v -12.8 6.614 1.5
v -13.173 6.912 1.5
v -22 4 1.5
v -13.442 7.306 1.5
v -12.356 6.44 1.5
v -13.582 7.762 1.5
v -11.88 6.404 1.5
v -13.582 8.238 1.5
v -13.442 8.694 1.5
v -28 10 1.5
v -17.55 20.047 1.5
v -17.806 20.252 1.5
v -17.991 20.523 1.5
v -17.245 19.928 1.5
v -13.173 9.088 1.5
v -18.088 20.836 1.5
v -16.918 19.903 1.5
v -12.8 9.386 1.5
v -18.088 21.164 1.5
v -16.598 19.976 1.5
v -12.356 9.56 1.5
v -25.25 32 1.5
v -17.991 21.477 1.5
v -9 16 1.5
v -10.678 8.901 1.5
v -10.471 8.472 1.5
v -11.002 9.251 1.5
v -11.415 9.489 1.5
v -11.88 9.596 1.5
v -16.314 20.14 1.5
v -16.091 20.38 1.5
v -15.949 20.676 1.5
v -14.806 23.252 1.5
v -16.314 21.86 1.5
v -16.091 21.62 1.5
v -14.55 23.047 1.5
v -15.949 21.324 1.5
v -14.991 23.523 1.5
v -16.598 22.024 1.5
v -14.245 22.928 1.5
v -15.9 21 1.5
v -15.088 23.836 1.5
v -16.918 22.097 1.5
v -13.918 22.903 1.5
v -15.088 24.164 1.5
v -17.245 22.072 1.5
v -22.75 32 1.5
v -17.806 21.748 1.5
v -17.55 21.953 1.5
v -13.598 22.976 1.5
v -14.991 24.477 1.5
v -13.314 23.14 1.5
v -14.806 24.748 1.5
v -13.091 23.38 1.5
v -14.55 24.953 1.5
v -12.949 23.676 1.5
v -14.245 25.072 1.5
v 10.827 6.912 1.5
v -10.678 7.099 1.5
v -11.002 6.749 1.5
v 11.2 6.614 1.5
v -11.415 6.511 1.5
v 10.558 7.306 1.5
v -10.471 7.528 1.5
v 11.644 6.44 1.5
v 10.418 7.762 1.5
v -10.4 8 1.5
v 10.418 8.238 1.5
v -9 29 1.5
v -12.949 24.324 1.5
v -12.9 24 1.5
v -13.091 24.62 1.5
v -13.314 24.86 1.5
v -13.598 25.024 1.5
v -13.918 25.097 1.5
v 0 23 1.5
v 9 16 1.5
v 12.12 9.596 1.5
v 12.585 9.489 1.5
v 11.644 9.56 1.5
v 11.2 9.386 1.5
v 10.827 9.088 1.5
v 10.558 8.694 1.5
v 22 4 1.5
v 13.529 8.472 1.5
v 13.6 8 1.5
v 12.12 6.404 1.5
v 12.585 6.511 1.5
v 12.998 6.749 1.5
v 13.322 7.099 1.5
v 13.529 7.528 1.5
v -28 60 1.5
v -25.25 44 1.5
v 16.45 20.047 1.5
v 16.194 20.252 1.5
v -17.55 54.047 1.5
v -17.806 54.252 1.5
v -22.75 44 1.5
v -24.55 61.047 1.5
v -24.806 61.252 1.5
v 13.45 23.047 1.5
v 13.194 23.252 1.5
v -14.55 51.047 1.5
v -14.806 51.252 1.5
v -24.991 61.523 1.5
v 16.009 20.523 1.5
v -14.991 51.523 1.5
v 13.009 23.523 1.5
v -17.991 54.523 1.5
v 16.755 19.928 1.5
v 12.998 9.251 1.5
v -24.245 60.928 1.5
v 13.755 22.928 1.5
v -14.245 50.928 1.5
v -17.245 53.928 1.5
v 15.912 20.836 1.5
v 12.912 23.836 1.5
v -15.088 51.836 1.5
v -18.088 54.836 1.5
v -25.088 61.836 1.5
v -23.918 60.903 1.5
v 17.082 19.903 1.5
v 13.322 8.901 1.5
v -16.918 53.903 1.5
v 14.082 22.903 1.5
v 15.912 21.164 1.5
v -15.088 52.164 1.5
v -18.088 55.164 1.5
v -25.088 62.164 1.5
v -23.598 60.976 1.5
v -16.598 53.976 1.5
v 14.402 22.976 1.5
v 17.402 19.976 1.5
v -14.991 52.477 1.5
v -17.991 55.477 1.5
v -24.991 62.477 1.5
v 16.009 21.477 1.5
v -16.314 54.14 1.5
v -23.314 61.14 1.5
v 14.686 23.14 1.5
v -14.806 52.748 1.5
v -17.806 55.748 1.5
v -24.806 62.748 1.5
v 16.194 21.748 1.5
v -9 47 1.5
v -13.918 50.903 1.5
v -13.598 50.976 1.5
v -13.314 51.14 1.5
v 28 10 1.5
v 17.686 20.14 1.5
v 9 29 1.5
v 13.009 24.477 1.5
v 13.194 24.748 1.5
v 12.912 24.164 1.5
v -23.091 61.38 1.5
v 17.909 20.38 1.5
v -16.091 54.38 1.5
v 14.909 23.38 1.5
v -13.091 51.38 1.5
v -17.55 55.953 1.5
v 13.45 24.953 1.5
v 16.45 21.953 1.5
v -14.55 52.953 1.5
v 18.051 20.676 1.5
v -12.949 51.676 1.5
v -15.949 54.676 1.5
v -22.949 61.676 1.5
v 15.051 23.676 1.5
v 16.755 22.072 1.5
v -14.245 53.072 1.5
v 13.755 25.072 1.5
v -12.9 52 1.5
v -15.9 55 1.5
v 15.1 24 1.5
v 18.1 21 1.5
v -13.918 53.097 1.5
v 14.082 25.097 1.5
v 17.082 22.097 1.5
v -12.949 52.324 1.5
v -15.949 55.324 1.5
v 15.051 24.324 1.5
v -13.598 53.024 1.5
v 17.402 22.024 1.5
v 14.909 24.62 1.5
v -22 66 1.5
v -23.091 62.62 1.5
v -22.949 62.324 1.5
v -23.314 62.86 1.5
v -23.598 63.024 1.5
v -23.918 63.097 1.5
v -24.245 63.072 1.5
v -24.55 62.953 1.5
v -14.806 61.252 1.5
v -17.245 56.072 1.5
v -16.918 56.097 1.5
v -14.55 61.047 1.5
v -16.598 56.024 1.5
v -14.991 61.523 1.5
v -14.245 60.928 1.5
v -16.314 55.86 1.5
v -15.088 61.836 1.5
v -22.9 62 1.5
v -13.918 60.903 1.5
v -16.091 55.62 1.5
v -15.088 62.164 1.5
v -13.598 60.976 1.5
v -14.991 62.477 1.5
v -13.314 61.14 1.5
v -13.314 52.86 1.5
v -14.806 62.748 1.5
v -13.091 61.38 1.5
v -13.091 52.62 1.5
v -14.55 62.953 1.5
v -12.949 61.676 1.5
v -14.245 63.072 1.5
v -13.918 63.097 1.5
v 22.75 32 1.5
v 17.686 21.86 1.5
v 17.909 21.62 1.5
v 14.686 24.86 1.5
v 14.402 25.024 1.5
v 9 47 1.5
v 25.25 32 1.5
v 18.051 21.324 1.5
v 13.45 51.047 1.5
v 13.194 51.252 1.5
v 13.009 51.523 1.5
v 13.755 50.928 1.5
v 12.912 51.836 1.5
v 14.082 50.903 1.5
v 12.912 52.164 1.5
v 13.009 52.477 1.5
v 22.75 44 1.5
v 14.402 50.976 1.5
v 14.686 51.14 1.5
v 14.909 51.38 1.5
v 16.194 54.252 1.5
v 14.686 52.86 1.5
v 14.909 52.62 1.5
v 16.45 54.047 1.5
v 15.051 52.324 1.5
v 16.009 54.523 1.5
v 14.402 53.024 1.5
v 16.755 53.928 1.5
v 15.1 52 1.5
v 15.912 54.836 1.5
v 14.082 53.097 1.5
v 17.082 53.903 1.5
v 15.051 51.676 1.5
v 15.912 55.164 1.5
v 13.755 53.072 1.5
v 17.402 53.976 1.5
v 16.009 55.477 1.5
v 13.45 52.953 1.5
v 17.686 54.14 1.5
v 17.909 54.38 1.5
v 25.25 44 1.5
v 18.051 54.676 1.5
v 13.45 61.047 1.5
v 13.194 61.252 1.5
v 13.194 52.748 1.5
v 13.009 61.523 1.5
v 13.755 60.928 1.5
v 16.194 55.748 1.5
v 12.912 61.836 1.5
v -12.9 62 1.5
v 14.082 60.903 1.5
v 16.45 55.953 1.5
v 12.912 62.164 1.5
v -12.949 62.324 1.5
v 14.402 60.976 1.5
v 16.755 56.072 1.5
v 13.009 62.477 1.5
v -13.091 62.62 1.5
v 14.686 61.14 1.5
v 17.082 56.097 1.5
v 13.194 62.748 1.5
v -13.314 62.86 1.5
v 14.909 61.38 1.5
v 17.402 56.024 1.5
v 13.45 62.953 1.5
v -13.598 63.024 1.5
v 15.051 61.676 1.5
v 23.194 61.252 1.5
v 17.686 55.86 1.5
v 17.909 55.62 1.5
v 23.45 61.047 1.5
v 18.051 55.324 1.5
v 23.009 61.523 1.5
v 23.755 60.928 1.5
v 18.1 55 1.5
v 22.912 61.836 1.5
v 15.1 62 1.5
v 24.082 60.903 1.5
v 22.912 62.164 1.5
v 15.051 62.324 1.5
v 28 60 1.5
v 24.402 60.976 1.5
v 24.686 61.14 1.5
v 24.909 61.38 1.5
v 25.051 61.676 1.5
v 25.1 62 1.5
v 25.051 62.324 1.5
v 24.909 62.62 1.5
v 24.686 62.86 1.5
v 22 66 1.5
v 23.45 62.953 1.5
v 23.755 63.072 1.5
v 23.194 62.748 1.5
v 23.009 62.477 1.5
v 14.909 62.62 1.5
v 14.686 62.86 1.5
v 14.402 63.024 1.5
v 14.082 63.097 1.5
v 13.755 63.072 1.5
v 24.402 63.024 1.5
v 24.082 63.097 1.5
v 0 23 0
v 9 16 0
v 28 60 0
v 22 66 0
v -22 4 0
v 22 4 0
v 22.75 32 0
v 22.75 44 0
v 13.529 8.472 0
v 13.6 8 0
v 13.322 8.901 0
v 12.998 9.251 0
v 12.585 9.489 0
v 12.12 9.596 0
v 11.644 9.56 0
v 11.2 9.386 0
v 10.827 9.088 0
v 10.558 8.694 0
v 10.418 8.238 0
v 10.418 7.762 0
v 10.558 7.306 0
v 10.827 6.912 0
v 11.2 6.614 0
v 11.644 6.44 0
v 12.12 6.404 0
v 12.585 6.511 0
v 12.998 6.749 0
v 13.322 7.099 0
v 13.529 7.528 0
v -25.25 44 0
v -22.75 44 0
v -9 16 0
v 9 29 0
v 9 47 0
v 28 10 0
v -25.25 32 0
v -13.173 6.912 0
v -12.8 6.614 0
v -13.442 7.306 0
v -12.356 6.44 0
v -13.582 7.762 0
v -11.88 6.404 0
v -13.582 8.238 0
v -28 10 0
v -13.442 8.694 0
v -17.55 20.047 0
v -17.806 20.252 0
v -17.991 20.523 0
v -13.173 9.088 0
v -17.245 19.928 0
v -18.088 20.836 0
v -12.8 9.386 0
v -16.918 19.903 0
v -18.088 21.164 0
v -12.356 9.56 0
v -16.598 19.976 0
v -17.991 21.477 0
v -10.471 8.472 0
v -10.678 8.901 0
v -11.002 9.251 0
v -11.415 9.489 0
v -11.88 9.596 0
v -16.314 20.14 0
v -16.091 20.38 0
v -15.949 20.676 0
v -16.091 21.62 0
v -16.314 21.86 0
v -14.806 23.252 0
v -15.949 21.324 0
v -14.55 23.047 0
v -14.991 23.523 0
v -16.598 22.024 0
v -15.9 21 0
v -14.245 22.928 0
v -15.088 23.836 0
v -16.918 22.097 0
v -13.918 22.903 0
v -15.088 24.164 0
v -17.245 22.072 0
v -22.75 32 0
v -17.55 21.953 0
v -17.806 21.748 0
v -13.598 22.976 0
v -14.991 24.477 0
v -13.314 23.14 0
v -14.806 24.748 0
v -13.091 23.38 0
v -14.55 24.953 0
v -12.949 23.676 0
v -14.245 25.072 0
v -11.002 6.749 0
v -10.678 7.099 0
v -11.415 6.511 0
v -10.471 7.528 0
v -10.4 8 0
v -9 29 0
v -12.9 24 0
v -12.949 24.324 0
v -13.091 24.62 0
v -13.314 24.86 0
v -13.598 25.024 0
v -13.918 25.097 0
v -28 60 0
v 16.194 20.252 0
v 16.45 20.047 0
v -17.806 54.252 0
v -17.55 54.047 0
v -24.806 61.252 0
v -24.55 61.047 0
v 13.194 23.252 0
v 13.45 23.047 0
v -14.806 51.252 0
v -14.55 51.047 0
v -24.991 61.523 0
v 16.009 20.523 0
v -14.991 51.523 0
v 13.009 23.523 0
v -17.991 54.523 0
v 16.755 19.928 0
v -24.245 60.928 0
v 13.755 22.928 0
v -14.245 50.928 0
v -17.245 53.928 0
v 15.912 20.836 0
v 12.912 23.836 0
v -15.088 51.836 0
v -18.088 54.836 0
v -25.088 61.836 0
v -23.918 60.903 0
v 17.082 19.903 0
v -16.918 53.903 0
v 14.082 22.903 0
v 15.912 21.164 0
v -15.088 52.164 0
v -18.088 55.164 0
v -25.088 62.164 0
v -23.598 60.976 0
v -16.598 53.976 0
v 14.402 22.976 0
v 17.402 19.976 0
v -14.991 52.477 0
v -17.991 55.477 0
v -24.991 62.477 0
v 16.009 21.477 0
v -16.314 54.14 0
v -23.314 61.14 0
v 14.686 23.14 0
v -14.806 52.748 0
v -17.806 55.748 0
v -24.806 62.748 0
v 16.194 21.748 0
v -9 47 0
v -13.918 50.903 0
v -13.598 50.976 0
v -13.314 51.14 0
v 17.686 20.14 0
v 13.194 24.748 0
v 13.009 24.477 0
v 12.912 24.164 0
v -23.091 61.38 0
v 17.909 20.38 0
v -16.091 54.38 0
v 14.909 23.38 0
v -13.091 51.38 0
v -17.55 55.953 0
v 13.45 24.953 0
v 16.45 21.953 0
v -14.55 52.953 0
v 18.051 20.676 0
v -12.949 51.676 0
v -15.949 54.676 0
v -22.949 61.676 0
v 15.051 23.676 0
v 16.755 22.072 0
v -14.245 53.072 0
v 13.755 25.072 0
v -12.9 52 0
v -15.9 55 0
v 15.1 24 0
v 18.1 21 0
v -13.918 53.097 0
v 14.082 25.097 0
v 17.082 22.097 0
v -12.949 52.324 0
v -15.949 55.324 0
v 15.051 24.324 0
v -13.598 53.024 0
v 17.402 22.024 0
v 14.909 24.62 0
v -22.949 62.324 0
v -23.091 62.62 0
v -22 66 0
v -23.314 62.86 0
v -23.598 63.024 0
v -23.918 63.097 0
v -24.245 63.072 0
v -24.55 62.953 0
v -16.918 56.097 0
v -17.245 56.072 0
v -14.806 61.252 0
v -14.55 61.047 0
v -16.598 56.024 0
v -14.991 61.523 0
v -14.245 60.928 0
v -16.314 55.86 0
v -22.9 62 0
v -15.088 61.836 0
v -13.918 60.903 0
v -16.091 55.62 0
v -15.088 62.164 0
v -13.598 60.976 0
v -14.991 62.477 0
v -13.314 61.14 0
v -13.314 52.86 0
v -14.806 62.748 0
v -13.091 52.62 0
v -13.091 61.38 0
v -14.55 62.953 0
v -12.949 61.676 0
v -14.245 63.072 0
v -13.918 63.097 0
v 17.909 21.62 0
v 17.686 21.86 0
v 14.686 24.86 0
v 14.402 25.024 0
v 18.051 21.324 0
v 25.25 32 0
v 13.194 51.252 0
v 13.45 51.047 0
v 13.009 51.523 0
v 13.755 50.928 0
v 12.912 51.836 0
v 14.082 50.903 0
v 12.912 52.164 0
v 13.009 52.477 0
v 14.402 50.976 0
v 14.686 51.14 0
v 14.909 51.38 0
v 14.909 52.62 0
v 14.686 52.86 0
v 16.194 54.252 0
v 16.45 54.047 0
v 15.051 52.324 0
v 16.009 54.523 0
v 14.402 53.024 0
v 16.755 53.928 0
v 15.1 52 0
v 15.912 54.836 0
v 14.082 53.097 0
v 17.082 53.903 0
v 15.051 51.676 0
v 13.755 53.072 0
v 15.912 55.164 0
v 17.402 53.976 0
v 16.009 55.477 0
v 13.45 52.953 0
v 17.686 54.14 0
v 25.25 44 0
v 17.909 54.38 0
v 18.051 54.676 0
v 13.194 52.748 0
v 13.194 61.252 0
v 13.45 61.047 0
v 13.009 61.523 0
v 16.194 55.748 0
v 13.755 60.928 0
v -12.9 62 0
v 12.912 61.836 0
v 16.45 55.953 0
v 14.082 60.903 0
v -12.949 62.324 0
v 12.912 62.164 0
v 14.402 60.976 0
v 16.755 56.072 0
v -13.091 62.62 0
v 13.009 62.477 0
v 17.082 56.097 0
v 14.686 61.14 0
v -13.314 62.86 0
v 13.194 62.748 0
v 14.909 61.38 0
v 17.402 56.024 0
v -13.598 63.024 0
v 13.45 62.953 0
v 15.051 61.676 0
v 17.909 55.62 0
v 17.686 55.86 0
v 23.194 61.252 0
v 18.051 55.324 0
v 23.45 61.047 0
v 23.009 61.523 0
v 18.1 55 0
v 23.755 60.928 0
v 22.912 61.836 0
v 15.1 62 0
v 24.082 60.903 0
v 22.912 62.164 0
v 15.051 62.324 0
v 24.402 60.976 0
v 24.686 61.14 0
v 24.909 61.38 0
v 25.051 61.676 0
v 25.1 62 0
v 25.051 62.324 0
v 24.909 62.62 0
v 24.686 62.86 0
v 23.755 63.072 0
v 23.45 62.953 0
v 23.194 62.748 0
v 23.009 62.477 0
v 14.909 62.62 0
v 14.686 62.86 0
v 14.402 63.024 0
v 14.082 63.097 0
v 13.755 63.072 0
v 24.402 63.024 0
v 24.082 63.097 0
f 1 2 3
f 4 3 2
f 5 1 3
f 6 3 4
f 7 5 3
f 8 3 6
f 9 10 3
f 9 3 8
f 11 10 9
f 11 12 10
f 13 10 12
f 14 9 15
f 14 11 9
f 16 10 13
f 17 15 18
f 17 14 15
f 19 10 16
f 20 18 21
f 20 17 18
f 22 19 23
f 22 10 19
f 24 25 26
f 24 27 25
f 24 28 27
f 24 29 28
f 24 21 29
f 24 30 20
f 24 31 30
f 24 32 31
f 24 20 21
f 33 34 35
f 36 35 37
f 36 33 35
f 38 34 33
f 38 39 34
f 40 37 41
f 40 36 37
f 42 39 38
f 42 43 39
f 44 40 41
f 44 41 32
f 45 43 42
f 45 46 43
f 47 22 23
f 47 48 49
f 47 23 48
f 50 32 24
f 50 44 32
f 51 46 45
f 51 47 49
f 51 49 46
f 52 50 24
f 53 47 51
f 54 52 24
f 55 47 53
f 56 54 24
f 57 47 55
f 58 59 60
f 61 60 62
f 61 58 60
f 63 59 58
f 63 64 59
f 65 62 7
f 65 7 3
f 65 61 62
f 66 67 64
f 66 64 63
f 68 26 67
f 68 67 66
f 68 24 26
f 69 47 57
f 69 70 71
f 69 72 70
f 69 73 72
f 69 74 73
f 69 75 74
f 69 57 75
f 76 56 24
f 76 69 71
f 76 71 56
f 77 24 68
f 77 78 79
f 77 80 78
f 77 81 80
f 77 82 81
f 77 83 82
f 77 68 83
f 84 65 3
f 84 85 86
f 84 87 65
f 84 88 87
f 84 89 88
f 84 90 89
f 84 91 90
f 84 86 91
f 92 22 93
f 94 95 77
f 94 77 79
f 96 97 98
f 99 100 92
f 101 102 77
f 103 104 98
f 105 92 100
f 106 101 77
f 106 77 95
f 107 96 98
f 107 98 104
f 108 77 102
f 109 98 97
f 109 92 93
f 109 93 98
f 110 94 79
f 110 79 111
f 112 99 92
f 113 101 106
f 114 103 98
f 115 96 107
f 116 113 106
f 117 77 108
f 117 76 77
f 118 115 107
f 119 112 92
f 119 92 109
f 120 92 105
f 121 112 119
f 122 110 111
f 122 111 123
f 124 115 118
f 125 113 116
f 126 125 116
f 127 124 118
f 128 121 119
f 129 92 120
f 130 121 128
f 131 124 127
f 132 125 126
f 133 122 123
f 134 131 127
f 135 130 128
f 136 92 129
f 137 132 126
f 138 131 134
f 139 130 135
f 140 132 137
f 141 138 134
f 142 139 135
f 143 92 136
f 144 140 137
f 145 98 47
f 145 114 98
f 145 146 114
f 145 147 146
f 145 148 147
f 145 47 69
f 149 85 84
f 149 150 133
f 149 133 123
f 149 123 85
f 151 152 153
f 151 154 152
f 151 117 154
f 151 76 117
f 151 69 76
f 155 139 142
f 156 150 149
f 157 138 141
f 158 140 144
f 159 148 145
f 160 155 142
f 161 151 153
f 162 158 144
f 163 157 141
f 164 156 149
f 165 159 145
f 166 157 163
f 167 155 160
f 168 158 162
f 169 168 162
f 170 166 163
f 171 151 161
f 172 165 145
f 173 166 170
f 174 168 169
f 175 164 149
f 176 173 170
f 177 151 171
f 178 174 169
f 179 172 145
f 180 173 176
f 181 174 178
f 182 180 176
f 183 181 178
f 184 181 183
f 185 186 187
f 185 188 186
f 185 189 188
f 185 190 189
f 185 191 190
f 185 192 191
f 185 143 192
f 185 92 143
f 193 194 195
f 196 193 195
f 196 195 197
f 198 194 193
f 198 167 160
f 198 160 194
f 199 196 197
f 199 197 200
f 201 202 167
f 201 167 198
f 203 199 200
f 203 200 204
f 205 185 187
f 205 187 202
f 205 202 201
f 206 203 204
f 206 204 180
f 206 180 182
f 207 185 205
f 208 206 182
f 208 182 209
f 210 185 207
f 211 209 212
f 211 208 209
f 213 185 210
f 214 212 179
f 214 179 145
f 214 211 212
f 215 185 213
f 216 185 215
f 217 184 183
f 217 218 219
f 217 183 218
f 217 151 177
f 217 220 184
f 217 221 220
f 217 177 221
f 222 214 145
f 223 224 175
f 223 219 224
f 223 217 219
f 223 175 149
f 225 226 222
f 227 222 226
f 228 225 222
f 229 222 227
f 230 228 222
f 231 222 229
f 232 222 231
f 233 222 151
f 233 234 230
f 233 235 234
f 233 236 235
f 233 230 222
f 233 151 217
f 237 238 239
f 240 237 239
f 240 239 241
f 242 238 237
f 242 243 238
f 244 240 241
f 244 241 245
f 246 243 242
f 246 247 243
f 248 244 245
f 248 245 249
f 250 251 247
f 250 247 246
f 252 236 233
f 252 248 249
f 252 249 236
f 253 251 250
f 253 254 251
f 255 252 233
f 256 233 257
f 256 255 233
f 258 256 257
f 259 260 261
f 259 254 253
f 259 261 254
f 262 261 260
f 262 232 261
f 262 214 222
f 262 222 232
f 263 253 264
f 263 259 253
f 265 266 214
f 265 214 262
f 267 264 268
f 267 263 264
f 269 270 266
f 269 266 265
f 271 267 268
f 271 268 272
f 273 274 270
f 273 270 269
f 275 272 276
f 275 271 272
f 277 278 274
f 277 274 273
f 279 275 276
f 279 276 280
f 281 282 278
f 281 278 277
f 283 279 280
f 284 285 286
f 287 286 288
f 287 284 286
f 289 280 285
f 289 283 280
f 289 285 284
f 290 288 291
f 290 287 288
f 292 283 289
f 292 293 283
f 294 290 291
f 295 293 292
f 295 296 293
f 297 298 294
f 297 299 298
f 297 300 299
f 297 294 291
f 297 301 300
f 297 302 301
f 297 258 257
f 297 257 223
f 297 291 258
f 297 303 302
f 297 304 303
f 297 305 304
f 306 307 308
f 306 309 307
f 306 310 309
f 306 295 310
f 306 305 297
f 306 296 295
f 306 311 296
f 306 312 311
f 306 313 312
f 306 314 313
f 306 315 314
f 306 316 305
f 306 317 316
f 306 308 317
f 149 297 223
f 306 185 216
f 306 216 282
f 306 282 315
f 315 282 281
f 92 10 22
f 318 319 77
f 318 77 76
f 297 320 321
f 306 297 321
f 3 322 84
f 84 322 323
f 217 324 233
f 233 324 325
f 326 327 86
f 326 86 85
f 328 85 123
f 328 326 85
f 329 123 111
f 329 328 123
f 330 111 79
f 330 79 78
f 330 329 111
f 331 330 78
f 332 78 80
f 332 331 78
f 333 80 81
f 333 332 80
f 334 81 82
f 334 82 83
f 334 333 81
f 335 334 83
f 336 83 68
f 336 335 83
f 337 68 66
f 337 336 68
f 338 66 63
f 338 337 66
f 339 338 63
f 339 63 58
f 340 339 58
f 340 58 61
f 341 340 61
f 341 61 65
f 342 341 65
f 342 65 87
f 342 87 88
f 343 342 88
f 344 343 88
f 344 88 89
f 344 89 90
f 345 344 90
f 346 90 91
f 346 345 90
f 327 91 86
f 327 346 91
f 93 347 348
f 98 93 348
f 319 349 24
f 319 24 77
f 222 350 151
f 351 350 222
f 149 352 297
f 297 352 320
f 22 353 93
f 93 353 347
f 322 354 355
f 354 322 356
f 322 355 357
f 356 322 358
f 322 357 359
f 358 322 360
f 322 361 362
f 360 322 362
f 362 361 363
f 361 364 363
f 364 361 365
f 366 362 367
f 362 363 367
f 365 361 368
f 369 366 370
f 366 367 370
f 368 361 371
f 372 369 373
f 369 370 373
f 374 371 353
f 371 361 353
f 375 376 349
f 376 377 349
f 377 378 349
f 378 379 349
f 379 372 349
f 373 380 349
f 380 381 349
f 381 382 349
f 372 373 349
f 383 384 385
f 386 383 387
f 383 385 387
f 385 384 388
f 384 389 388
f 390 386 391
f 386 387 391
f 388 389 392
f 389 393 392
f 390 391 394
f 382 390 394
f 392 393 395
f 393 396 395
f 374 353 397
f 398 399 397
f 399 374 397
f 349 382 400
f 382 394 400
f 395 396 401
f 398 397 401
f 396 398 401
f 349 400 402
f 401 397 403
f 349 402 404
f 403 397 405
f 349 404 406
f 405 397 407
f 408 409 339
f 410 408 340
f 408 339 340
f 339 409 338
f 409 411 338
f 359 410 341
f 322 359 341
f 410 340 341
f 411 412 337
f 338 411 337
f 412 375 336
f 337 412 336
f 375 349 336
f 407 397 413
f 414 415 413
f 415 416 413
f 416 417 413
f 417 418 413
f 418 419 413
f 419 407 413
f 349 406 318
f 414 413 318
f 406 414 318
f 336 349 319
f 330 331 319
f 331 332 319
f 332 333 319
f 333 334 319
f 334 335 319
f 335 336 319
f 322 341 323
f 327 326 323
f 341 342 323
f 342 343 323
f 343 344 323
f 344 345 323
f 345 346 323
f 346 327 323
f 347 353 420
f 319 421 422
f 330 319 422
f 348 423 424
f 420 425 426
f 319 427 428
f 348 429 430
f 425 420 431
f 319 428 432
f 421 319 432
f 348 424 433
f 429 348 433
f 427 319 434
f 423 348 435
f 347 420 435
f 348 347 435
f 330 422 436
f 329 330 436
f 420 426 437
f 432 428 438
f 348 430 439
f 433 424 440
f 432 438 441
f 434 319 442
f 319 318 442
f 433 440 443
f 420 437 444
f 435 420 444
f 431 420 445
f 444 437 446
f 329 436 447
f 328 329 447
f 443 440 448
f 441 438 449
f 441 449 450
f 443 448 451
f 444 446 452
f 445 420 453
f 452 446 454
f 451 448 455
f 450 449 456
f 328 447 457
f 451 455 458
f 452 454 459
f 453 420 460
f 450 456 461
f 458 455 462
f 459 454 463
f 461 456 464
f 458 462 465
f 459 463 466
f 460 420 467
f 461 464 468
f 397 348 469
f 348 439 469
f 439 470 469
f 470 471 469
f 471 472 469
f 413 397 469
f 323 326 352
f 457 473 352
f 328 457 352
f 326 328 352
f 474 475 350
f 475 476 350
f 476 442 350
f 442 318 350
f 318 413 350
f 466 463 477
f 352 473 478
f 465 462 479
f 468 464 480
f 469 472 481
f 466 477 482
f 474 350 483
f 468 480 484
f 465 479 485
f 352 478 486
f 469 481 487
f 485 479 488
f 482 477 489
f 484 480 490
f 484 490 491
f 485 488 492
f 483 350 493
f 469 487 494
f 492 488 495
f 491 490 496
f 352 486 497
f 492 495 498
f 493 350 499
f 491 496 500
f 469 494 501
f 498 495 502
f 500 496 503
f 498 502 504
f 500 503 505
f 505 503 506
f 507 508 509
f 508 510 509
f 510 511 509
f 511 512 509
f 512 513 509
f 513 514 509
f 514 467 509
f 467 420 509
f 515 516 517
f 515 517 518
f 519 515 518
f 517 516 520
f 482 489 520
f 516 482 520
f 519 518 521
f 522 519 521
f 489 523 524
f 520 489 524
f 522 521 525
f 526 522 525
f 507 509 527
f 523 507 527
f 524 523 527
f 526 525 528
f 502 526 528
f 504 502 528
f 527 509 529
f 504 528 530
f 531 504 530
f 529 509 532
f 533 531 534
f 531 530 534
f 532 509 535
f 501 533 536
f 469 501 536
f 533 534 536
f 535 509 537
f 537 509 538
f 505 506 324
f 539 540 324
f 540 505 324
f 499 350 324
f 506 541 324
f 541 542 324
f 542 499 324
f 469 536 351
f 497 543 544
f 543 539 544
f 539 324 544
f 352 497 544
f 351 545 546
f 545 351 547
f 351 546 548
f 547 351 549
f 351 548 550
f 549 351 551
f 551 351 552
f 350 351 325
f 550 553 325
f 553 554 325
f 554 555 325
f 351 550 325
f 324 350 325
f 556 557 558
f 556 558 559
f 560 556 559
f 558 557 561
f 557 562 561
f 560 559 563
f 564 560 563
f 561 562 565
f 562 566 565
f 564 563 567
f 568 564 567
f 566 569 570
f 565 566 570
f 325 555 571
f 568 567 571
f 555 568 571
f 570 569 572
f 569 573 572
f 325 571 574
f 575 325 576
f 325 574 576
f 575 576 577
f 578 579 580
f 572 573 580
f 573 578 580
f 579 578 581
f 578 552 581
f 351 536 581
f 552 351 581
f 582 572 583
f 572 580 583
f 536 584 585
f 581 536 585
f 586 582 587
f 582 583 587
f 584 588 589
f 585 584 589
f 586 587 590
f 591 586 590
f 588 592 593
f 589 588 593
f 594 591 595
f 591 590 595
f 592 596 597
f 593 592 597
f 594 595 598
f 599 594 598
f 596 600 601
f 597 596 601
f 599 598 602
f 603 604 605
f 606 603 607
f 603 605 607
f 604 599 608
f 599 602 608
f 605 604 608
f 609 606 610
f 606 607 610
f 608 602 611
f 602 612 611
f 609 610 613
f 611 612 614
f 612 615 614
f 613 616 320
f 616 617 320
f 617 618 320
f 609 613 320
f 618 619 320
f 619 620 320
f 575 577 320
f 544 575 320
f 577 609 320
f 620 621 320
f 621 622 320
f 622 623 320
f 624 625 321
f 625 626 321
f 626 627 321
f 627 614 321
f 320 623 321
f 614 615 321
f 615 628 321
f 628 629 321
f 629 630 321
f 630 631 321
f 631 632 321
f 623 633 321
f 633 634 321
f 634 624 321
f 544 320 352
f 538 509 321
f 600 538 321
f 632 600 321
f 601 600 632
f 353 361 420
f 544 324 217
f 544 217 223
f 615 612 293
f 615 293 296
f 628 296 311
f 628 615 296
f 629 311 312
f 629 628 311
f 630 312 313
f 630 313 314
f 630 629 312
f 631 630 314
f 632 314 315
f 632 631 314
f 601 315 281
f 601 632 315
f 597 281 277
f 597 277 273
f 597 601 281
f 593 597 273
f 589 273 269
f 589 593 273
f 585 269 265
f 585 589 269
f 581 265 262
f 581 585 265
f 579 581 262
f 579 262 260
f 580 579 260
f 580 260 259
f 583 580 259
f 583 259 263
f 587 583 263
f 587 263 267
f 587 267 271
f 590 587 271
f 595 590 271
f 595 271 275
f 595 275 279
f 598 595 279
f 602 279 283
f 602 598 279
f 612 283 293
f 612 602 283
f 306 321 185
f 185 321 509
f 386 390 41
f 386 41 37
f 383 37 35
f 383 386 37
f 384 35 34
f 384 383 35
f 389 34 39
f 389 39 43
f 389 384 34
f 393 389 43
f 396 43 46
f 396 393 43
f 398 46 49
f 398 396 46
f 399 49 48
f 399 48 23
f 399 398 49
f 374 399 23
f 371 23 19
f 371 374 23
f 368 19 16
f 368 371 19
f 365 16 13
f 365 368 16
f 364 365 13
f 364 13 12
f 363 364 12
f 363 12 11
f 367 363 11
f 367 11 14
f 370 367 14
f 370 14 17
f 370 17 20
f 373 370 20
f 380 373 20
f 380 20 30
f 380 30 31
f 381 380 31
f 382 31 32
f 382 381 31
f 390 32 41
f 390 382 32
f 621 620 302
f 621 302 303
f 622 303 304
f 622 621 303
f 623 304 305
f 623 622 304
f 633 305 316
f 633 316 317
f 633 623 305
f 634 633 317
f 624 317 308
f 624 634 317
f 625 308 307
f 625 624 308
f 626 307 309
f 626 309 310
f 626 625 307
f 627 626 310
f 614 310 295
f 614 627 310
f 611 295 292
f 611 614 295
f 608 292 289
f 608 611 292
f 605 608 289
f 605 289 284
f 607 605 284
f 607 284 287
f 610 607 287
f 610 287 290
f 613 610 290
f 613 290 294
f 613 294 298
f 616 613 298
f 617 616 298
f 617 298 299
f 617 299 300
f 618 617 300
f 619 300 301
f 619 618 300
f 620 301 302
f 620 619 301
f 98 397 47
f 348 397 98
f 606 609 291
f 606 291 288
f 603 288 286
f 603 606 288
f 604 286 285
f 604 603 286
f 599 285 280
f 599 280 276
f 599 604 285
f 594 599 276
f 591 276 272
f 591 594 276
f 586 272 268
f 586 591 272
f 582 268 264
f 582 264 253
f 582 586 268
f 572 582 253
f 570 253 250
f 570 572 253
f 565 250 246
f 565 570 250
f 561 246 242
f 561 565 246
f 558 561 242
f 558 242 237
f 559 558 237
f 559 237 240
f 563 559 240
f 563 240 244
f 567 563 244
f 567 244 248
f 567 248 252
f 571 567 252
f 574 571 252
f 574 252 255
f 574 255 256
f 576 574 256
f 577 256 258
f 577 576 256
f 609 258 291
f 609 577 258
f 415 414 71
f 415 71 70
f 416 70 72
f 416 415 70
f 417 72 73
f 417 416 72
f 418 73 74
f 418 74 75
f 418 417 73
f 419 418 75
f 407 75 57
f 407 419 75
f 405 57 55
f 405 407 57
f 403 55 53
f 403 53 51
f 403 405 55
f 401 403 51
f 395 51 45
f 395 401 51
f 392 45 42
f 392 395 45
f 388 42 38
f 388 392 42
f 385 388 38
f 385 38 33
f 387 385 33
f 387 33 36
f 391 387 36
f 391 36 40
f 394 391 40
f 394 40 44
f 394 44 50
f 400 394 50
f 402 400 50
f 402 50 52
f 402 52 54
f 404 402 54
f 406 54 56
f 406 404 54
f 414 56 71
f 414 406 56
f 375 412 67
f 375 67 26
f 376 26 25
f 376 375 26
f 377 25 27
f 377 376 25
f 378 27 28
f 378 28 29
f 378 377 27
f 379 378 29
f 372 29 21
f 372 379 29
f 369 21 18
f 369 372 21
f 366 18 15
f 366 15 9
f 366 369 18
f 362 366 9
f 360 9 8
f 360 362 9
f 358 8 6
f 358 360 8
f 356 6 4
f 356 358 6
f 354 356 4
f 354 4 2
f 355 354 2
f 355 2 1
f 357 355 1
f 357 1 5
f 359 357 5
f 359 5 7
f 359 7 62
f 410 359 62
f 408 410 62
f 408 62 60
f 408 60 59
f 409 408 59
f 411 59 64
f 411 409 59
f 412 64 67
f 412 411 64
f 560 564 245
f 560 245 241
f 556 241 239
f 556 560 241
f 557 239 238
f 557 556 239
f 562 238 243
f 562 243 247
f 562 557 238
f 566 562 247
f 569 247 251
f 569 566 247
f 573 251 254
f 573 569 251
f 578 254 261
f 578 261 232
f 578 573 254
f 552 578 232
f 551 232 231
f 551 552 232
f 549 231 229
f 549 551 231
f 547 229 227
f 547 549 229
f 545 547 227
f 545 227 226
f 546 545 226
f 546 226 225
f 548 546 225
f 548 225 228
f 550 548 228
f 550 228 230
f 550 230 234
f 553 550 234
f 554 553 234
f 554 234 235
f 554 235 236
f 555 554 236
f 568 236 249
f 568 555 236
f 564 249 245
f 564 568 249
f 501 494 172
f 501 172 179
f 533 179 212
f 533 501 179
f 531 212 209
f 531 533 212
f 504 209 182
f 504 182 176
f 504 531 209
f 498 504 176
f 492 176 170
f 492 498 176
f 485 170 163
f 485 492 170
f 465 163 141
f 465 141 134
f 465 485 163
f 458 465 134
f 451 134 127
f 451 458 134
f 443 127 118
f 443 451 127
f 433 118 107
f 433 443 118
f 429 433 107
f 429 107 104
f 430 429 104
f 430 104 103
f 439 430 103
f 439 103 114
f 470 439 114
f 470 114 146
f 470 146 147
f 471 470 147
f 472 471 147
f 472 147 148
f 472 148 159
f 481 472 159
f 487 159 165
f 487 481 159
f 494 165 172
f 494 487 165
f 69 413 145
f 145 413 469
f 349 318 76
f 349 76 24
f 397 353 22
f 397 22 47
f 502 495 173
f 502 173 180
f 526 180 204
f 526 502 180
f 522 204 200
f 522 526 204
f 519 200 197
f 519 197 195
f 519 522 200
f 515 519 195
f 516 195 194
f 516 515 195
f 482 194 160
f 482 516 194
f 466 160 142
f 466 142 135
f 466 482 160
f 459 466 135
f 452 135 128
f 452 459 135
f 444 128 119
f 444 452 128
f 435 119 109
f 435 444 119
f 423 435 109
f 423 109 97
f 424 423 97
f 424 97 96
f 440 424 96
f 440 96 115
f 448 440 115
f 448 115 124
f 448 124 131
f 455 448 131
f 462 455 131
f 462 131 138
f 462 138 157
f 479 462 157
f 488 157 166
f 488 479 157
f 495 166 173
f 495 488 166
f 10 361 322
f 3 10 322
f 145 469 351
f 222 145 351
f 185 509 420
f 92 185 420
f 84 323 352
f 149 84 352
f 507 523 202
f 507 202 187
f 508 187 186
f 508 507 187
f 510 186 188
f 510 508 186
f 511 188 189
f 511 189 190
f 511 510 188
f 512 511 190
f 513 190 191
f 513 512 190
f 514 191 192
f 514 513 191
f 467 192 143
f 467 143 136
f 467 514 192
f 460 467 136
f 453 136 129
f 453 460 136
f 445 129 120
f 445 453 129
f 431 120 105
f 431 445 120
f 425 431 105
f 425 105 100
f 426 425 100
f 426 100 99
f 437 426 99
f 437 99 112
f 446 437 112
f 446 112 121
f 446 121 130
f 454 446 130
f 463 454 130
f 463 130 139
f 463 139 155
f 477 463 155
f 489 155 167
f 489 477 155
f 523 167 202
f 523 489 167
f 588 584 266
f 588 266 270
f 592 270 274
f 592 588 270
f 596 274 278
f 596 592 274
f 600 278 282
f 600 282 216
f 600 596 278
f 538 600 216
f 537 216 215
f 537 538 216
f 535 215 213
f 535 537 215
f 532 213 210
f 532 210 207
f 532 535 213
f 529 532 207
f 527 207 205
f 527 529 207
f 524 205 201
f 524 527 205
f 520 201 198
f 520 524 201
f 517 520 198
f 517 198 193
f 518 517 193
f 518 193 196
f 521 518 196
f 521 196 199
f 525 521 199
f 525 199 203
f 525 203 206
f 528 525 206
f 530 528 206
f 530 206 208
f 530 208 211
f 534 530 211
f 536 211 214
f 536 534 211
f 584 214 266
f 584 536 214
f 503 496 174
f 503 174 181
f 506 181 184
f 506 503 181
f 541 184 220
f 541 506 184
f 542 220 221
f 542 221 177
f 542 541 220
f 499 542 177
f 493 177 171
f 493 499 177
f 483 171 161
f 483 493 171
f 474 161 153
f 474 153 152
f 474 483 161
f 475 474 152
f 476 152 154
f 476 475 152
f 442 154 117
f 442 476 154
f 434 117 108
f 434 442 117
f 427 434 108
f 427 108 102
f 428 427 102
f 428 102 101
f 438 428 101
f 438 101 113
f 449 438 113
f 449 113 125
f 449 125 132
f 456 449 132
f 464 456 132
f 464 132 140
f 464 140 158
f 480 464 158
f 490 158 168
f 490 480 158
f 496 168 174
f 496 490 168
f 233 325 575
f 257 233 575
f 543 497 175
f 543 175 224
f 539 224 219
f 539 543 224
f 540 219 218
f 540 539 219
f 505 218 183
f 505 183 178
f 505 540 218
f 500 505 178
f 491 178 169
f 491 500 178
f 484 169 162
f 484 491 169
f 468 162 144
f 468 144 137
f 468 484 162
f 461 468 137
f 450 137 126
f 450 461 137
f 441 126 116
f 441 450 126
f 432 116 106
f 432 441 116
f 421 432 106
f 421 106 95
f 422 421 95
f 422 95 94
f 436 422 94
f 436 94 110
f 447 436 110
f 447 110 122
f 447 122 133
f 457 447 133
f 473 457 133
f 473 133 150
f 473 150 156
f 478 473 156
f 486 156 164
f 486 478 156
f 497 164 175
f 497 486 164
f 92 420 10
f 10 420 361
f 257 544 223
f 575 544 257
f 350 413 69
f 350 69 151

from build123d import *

# Parameters (mm, degrees)
SKETCH_1_R        = 1.6
SKETCH_1_R_2      = 1.1
SKETCH_1_W        = 2.5
SKETCH_1_H        = 12
SKETCH_1_W_2      = 18
SKETCH_1_H_2      = 18
EXTRUDE_284_DEPTH = 1.5
SKETCH_2_R        = 1.1
D2P2_DEPTH        = 1.5


with BuildPart() as part:
    # 草图1 → Extrude 284 (new body)
    with BuildSketch(Plane.XY):
        Polygon((-22, 4), (22, 4), (28, 10), (28, 60), (22, 66), (-22, 66), (-28, 60), (-28, 10), align=None)
        with Locations((-12, 8)):
            Circle(SKETCH_1_R, mode=Mode.SUBTRACT)
        with Locations((-24, 62)):
            Circle(SKETCH_1_R_2, mode=Mode.SUBTRACT)
        with Locations((12, 8)):
            Circle(SKETCH_1_R, mode=Mode.SUBTRACT)
        with Locations((24, 62)):
            Circle(SKETCH_1_R_2, mode=Mode.SUBTRACT)
        with Locations((-14, 24)):
            Circle(SKETCH_1_R_2, mode=Mode.SUBTRACT)
        with Locations((-14, 52)):
            Circle(SKETCH_1_R_2, mode=Mode.SUBTRACT)
        with Locations((14, 24)):
            Circle(SKETCH_1_R_2, mode=Mode.SUBTRACT)
        with Locations((14, 52)):
            Circle(SKETCH_1_R_2, mode=Mode.SUBTRACT)
        with Locations((-17, 21)):
            Circle(SKETCH_1_R_2, mode=Mode.SUBTRACT)
        with Locations((-17, 55)):
            Circle(SKETCH_1_R_2, mode=Mode.SUBTRACT)
        with Locations((17, 21)):
            Circle(SKETCH_1_R_2, mode=Mode.SUBTRACT)
        with Locations((17, 55)):
            Circle(SKETCH_1_R_2, mode=Mode.SUBTRACT)
        with Locations((-24, 38)):
            Rectangle(SKETCH_1_W, SKETCH_1_H, mode=Mode.SUBTRACT)
        with Locations((24, 38)):
            Rectangle(SKETCH_1_W, SKETCH_1_H, mode=Mode.SUBTRACT)
        with Locations((0, 38)):
            Rectangle(SKETCH_1_W_2, SKETCH_1_H_2, mode=Mode.SUBTRACT)
        Polygon((-9, 16), (9, 16), (0, 23), align=None, mode=Mode.SUBTRACT)
    extrude(amount=EXTRUDE_284_DEPTH)

    # 草图2 → 外拉钢索两孔_D2p2 (cut)
    with BuildSketch(Plane.XY):
        with Locations((-14, 62)):
            Circle(SKETCH_2_R)
        with Locations((14, 62)):
            Circle(SKETCH_2_R)
    extrude(amount=D2P2_DEPTH, mode=Mode.SUBTRACT)


solid = part.part
